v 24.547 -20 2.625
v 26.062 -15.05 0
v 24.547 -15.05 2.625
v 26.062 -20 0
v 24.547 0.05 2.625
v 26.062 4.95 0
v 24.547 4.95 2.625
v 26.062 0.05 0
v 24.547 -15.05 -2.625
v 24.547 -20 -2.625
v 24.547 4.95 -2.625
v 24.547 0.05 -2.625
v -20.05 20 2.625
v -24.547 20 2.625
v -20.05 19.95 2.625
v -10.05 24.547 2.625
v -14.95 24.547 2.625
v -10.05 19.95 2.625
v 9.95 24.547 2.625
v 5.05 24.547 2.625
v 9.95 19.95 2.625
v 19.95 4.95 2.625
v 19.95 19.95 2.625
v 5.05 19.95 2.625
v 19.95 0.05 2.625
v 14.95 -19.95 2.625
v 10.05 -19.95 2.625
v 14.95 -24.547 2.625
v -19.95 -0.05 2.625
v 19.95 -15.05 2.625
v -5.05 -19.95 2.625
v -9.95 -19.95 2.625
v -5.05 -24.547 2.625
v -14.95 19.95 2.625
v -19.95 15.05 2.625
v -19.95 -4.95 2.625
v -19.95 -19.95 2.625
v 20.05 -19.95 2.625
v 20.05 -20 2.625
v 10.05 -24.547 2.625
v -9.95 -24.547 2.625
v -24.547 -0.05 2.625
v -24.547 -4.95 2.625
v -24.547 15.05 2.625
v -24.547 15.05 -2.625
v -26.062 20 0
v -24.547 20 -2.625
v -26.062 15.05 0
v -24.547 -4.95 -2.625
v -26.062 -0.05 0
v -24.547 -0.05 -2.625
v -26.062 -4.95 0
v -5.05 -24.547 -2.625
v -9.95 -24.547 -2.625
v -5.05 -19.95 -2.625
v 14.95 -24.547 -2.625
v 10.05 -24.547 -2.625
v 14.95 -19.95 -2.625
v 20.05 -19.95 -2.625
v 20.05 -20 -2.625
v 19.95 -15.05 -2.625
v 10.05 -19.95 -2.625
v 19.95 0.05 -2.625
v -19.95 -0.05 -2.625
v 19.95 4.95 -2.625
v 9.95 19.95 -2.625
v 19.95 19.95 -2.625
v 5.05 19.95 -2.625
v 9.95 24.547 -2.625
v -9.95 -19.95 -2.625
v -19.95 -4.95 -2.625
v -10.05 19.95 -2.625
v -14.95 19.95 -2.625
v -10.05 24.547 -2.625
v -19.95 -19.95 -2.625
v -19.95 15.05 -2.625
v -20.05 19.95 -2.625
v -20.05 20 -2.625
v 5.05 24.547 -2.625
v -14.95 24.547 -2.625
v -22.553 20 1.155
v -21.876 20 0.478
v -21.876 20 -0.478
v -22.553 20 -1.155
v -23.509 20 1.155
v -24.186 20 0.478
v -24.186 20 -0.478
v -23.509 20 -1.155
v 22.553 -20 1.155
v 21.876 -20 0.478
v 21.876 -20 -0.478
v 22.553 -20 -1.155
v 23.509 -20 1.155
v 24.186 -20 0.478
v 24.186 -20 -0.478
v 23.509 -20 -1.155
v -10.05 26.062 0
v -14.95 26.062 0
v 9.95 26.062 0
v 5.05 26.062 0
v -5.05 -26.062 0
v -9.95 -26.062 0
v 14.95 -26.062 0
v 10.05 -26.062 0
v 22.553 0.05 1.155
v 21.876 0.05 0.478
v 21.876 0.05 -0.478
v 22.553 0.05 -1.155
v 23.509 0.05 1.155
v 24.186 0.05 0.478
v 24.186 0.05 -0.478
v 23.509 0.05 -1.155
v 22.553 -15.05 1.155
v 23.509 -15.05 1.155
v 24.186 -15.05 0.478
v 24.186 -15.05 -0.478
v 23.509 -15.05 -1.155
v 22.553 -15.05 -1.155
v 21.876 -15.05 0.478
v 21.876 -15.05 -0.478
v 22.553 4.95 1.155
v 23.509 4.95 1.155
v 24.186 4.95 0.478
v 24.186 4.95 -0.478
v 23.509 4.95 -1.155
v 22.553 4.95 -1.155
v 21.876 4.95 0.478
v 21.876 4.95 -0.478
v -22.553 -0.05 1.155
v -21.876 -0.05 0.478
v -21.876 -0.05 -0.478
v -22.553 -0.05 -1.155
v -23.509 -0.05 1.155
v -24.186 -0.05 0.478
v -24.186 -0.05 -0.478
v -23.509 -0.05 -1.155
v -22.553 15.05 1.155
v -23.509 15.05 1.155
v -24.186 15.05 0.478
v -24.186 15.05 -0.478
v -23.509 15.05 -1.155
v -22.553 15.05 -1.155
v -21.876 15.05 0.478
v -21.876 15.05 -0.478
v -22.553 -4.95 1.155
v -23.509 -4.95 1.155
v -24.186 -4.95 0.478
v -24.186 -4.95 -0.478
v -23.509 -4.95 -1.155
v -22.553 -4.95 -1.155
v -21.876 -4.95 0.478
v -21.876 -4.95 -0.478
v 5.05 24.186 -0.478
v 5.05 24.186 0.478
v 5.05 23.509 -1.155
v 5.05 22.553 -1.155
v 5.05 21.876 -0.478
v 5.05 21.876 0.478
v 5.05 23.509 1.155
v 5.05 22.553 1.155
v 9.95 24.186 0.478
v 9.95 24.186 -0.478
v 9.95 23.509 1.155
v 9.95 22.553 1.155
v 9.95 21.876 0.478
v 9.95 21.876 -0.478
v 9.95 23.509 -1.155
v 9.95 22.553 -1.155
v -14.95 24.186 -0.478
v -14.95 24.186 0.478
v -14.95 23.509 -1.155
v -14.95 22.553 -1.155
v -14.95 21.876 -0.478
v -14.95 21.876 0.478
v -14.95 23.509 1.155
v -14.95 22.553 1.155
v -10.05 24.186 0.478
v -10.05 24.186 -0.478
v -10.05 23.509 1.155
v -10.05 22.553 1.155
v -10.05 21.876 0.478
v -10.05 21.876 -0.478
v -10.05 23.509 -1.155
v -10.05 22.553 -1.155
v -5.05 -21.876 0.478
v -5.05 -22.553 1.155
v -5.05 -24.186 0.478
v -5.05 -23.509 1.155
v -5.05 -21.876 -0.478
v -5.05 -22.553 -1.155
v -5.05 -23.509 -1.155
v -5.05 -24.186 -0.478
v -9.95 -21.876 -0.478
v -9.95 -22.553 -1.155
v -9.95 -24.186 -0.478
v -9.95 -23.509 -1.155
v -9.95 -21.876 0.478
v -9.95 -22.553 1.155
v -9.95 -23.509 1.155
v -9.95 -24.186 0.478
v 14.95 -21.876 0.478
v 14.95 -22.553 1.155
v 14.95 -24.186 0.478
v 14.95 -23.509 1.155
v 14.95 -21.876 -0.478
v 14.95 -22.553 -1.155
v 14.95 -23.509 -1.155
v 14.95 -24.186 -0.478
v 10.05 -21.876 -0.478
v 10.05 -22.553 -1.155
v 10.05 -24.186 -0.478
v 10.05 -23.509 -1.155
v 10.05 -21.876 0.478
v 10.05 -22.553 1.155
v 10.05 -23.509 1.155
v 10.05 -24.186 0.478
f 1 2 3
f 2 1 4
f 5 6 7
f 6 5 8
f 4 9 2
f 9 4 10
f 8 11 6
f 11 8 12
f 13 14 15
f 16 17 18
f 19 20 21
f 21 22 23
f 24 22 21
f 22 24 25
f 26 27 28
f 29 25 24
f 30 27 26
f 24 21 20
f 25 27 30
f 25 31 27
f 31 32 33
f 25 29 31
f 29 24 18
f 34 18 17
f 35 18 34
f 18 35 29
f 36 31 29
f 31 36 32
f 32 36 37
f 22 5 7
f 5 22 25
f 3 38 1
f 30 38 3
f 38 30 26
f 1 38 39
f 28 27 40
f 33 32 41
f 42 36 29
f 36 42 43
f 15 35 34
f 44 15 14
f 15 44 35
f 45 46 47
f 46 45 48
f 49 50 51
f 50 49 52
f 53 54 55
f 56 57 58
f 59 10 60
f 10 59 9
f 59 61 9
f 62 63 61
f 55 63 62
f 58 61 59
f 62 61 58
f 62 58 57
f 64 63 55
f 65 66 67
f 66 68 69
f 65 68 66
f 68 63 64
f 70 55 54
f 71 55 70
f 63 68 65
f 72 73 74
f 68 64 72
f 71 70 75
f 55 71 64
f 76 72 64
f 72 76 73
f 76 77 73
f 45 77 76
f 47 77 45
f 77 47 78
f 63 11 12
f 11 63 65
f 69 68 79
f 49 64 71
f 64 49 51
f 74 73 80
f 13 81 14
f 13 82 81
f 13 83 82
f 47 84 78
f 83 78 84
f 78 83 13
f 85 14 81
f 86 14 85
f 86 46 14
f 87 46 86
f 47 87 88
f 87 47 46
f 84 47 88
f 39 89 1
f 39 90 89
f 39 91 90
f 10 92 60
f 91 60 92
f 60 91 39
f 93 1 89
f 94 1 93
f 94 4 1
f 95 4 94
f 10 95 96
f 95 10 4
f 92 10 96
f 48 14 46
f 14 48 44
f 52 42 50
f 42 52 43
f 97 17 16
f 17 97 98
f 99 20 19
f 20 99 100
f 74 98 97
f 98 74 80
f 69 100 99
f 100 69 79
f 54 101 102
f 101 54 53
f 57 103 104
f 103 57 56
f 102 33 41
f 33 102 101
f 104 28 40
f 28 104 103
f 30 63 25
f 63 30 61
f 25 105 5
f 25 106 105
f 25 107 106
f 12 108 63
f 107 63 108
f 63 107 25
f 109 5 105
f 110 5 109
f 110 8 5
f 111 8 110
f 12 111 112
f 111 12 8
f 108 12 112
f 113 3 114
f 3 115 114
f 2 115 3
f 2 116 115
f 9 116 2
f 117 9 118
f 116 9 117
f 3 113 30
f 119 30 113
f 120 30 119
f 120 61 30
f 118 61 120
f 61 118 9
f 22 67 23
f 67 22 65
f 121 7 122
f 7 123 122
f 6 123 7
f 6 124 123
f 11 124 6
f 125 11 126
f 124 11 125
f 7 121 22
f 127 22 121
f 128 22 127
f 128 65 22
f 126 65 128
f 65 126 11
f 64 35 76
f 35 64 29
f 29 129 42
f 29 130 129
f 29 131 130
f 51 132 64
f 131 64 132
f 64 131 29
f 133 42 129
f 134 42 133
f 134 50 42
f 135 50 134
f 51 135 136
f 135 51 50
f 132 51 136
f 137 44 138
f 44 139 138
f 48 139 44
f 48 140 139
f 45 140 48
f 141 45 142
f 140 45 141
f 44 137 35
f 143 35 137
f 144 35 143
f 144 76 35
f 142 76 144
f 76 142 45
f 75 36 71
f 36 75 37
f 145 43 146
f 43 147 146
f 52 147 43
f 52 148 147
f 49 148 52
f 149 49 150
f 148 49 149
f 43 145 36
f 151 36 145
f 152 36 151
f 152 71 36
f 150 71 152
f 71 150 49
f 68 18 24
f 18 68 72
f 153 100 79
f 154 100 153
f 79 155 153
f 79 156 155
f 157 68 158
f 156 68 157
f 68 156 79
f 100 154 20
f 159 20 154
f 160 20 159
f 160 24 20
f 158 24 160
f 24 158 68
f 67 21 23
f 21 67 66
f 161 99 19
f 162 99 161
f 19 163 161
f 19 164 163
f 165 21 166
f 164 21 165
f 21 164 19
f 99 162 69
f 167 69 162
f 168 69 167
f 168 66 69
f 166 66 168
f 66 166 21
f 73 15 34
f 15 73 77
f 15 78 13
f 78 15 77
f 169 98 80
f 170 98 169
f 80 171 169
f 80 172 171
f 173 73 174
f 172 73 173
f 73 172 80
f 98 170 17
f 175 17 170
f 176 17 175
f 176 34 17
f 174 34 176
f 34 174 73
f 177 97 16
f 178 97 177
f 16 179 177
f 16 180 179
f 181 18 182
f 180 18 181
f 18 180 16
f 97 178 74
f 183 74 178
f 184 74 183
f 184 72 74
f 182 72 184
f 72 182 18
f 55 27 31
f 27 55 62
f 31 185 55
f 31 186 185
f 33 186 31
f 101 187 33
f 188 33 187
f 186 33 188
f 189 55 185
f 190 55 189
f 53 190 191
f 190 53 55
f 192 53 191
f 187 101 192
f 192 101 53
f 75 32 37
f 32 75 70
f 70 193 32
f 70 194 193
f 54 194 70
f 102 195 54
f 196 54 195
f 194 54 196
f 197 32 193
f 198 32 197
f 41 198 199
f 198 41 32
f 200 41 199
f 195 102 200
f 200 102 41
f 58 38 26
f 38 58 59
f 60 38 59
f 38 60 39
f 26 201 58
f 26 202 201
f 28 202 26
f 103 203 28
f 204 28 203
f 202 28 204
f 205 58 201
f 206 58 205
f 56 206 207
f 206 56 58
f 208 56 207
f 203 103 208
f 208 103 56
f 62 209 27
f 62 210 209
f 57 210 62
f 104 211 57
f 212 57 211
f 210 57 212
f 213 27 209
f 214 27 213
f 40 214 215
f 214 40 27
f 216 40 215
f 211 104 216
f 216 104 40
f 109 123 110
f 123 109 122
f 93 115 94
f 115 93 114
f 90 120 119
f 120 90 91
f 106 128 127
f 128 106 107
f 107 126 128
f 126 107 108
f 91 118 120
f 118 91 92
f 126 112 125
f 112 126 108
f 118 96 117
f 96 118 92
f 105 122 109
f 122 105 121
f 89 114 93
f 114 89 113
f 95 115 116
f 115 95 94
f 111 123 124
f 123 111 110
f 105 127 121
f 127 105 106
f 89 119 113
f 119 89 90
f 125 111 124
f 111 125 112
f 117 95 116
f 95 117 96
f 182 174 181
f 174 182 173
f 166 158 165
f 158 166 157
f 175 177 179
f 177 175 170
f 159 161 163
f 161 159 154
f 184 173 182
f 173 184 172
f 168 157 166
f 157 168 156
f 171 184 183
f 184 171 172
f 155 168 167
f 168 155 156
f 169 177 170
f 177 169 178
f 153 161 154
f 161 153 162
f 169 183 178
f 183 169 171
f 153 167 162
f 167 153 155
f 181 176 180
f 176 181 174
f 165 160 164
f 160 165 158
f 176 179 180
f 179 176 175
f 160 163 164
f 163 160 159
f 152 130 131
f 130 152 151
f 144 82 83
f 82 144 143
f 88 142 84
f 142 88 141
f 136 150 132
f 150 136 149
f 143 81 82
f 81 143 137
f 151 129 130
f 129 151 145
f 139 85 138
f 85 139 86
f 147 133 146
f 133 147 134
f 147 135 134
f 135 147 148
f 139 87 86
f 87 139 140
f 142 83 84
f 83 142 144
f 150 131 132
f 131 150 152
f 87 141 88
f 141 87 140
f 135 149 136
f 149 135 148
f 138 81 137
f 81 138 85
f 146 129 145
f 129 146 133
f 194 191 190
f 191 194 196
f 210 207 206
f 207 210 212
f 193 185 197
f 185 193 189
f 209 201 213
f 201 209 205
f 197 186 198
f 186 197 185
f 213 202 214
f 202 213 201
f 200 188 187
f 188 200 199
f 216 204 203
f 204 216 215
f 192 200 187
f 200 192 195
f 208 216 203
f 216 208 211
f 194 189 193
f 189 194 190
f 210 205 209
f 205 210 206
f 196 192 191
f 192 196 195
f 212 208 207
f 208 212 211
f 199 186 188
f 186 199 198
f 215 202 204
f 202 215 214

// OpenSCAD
// Generated by SolidPython 0.4.6 on 2020-07-02 20:36:31
$fa = .01;
$fs = 1;


difference() {
	union() {
		hull() {
			translate(v = [-23.0310889132, 0, 0]) {
				rotate(a = [90, 0, 0]) {
					cylinder($fn = 6, center = true, d = 6.0621778265, h = 40);
				}
			}
			translate(v = [23.0310889132, 0, 0]) {
				rotate(a = [90, 0, 0]) {
					cylinder($fn = 6, center = true, d = 6.0621778265, h = 40);
				}
			}
		}
		rotate(a = [0, 0, 90]) {
			hull() {
				translate(v = [-23.0310889132, 0, 0]) {
					rotate(a = [90, 0, 0]) {
						cylinder($fn = 6, center = true, d = 6.0621778265, h = 40);
					}
				}
				translate(v = [23.0310889132, 0, 0]) {
					rotate(a = [90, 0, 0]) {
						cylinder($fn = 6, center = true, d = 6.0621778265, h = 40);
					}
				}
			}
		}
	}
	union() {
		union() {
			union() {
				translate(v = [0, -2.5000000000, 0]) {
					translate(v = [23.0310889132, 0, 0]) {
						cube(center = true, size = [6.1621778265, 5.1000000000, 6.1621778265]);
					}
				}
				translate(v = [0, -7.5000000000, 0]) {
					translate(v = [23.0310889132, 0, 0]) {
						cube(center = true, size = [6.1621778265, 5.1000000000, 6.1621778265]);
					}
				}
				translate(v = [0, -12.5000000000, 0]) {
					translate(v = [23.0310889132, 0, 0]) {
						cube(center = true, size = [6.1621778265, 5.1000000000, 6.1621778265]);
					}
				}
			}
			translate(v = [0, 20.0000000000, 0]) {
				union() {
					translate(v = [0, -2.5000000000, 0]) {
						translate(v = [23.0310889132, 0, 0]) {
							cube(center = true, size = [6.1621778265, 5.1000000000, 6.1621778265]);
						}
					}
					translate(v = [0, -7.5000000000, 0]) {
						translate(v = [23.0310889132, 0, 0]) {
							cube(center = true, size = [6.1621778265, 5.1000000000, 6.1621778265]);
						}
					}
					translate(v = [0, -12.5000000000, 0]) {
						translate(v = [23.0310889132, 0, 0]) {
							cube(center = true, size = [6.1621778265, 5.1000000000, 6.1621778265]);
						}
					}
				}
			}
		}
		rotate(a = [0, 0, 180]) {
			union() {
				union() {
					translate(v = [0, -2.5000000000, 0]) {
						translate(v = [23.0310889132, 0, 0]) {
							cube(center = true, size = [6.1621778265, 5.1000000000, 6.1621778265]);
						}
					}
					translate(v = [0, -7.5000000000, 0]) {
						translate(v = [23.0310889132, 0, 0]) {
							cube(center = true, size = [6.1621778265, 5.1000000000, 6.1621778265]);
						}
					}
					translate(v = [0, -12.5000000000, 0]) {
						translate(v = [23.0310889132, 0, 0]) {
							cube(center = true, size = [6.1621778265, 5.1000000000, 6.1621778265]);
						}
					}
				}
				translate(v = [0, 20.0000000000, 0]) {
					union() {
						translate(v = [0, -2.5000000000, 0]) {
							translate(v = [23.0310889132, 0, 0]) {
								cube(center = true, size = [6.1621778265, 5.1000000000, 6.1621778265]);
							}
						}
						translate(v = [0, -7.5000000000, 0]) {
							translate(v = [23.0310889132, 0, 0]) {
								cube(center = true, size = [6.1621778265, 5.1000000000, 6.1621778265]);
							}
						}
						translate(v = [0, -12.5000000000, 0]) {
							translate(v = [23.0310889132, 0, 0]) {
								cube(center = true, size = [6.1621778265, 5.1000000000, 6.1621778265]);
							}
						}
					}
				}
			}
		}
	}
	rotate(a = [0, 0, 90]) {
		union() {
			union() {
				union() {
					translate(v = [0, -2.5000000000, 0]) {
						translate(v = [23.0310889132, 0, 0]) {
							cube(center = true, size = [6.1621778265, 5.1000000000, 6.1621778265]);
						}
					}
					translate(v = [0, -12.5000000000, 0]) {
						translate(v = [23.0310889132, 0, 0]) {
							cube(center = true, size = [6.1621778265, 5.1000000000, 6.1621778265]);
						}
					}
					translate(v = [0, -17.5000000000, 0]) {
						translate(v = [23.0310889132, 0, 0]) {
							cube(center = true, size = [6.1621778265, 5.1000000000, 6.1621778265]);
						}
					}
				}
				translate(v = [0, 20.0000000000, 0]) {
					union() {
						translate(v = [0, -2.5000000000, 0]) {
							translate(v = [23.0310889132, 0, 0]) {
								cube(center = true, size = [6.1621778265, 5.1000000000, 6.1621778265]);
							}
						}
						translate(v = [0, -12.5000000000, 0]) {
							translate(v = [23.0310889132, 0, 0]) {
								cube(center = true, size = [6.1621778265, 5.1000000000, 6.1621778265]);
							}
						}
						translate(v = [0, -17.5000000000, 0]) {
							translate(v = [23.0310889132, 0, 0]) {
								cube(center = true, size = [6.1621778265, 5.1000000000, 6.1621778265]);
							}
						}
					}
				}
			}
			rotate(a = [0, 0, 180]) {
				union() {
					union() {
						translate(v = [0, -2.5000000000, 0]) {
							translate(v = [23.0310889132, 0, 0]) {
								cube(center = true, size = [6.1621778265, 5.1000000000, 6.1621778265]);
							}
						}
						translate(v = [0, -12.5000000000, 0]) {
							translate(v = [23.0310889132, 0, 0]) {
								cube(center = true, size = [6.1621778265, 5.1000000000, 6.1621778265]);
							}
						}
						translate(v = [0, -17.5000000000, 0]) {
							translate(v = [23.0310889132, 0, 0]) {
								cube(center = true, size = [6.1621778265, 5.1000000000, 6.1621778265]);
							}
						}
					}
					translate(v = [0, 20.0000000000, 0]) {
						union() {
							translate(v = [0, -2.5000000000, 0]) {
								translate(v = [23.0310889132, 0, 0]) {
									cube(center = true, size = [6.1621778265, 5.1000000000, 6.1621778265]);
								}
							}
							translate(v = [0, -12.5000000000, 0]) {
								translate(v = [23.0310889132, 0, 0]) {
									cube(center = true, size = [6.1621778265, 5.1000000000, 6.1621778265]);
								}
							}
							translate(v = [0, -17.5000000000, 0]) {
								translate(v = [23.0310889132, 0, 0]) {
									cube(center = true, size = [6.1621778265, 5.1000000000, 6.1621778265]);
								}
							}
						}
					}
				}
			}
		}
	}
	union() {
		translate(v = [23.0310889132, 0, 0]) {
			rotate(a = [90, 22.5000000000, 0]) {
				cylinder($fn = 8, center = true, d = 2.5000000000, h = 40.1000000000);
			}
		}
		rotate(a = [0, 0, 90]) {
			translate(v = [23.0310889132, 0, 0]) {
				rotate(a = [90, 22.5000000000, 0]) {
					cylinder($fn = 8, center = true, d = 2.5000000000, h = 40.1000000000);
				}
			}
		}
		rotate(a = [0, 0, 180]) {
			translate(v = [23.0310889132, 0, 0]) {
				rotate(a = [90, 22.5000000000, 0]) {
					cylinder($fn = 8, center = true, d = 2.5000000000, h = 40.1000000000);
				}
			}
		}
		rotate(a = [0, 0, 270]) {
			translate(v = [23.0310889132, 0, 0]) {
				rotate(a = [90, 22.5000000000, 0]) {
					cylinder($fn = 8, center = true, d = 2.5000000000, h = 40.1000000000);
				}
			}
		}
	}
}
/***********************************************
*********      SolidPython code:      **********
************************************************
 
import os
from os.path import join as path_join
from typing import Iterable

from solid import *
from solid.utils import *


def line(
        a: Tuple[float, float, float],
        b: Tuple[float, float, float],
        r: float = 1.0,
        capped=True,
):
    if capped:
        return hull()(translate(a)(sphere(r=r)), translate(b)(sphere(r=r)))
    else:
        return hull()(
            hull()(translate(a)(sphere(r=r)), translate(b)(sphere(r=r)))
            - translate(a)(sphere(r=r))
            - translate(b)(sphere(r=r))
        )


def mix(p1: Tuple[float, float, float], p2: Tuple[float, float, float], a: float):
    if len(p1) != len(p2):
        raise IndexError()
    return tuple((x * (1 - a)) + (y * a) for x, y in zip(p1, p2))


def pairwise_hull(objs: Iterable[OpenSCADObject]):
    return sum(hull()(a, b) for a, b in zip(objs, objs[1:]))


def generate_part(part, partname, resolution=0.1):
    if not os.path.exists("generated"):
        os.makedirs("generated")
    scad_render_to_file(
        part,
        path_join("generated", f"{partname}.scad"),
        file_header=f"$fa = .01;\n$fs = {resolution};\n",
    )


standard_pips = (
    (
        (0, 0),
    ),
    (
        (-1, -1),
        (1, 1),
    ),
    (
        (-1, -1),
        (0, 0),
        (1, 1),
    ),
    (
        (-1, -1),
        (-1, 1),
        (1, -1),
        (1, 1),
    ),
    (
        (-1, -1),
        (-1, 1),
        (0, 0),
        (1, -1),
        (1, 1),
    ),
    (
        (-1, -1),
        (-1, 0),
        (-1, 1),
        (1, -1),
        (1, 0),
        (1, 1),
    ),
)

PHI = (1 + 5**.5)/2

phi = 1/PHI

def torus(major_r, minor_r, resolution):
    return rotate_extrude()(translate((major_r, 0, 0))(circle(minor_r)))


__all__ = ["line", "mix", "pairwise_hull", "generate_part", "standard_pips", "torus", "PHI", "phi"]
 
 
************************************************/
